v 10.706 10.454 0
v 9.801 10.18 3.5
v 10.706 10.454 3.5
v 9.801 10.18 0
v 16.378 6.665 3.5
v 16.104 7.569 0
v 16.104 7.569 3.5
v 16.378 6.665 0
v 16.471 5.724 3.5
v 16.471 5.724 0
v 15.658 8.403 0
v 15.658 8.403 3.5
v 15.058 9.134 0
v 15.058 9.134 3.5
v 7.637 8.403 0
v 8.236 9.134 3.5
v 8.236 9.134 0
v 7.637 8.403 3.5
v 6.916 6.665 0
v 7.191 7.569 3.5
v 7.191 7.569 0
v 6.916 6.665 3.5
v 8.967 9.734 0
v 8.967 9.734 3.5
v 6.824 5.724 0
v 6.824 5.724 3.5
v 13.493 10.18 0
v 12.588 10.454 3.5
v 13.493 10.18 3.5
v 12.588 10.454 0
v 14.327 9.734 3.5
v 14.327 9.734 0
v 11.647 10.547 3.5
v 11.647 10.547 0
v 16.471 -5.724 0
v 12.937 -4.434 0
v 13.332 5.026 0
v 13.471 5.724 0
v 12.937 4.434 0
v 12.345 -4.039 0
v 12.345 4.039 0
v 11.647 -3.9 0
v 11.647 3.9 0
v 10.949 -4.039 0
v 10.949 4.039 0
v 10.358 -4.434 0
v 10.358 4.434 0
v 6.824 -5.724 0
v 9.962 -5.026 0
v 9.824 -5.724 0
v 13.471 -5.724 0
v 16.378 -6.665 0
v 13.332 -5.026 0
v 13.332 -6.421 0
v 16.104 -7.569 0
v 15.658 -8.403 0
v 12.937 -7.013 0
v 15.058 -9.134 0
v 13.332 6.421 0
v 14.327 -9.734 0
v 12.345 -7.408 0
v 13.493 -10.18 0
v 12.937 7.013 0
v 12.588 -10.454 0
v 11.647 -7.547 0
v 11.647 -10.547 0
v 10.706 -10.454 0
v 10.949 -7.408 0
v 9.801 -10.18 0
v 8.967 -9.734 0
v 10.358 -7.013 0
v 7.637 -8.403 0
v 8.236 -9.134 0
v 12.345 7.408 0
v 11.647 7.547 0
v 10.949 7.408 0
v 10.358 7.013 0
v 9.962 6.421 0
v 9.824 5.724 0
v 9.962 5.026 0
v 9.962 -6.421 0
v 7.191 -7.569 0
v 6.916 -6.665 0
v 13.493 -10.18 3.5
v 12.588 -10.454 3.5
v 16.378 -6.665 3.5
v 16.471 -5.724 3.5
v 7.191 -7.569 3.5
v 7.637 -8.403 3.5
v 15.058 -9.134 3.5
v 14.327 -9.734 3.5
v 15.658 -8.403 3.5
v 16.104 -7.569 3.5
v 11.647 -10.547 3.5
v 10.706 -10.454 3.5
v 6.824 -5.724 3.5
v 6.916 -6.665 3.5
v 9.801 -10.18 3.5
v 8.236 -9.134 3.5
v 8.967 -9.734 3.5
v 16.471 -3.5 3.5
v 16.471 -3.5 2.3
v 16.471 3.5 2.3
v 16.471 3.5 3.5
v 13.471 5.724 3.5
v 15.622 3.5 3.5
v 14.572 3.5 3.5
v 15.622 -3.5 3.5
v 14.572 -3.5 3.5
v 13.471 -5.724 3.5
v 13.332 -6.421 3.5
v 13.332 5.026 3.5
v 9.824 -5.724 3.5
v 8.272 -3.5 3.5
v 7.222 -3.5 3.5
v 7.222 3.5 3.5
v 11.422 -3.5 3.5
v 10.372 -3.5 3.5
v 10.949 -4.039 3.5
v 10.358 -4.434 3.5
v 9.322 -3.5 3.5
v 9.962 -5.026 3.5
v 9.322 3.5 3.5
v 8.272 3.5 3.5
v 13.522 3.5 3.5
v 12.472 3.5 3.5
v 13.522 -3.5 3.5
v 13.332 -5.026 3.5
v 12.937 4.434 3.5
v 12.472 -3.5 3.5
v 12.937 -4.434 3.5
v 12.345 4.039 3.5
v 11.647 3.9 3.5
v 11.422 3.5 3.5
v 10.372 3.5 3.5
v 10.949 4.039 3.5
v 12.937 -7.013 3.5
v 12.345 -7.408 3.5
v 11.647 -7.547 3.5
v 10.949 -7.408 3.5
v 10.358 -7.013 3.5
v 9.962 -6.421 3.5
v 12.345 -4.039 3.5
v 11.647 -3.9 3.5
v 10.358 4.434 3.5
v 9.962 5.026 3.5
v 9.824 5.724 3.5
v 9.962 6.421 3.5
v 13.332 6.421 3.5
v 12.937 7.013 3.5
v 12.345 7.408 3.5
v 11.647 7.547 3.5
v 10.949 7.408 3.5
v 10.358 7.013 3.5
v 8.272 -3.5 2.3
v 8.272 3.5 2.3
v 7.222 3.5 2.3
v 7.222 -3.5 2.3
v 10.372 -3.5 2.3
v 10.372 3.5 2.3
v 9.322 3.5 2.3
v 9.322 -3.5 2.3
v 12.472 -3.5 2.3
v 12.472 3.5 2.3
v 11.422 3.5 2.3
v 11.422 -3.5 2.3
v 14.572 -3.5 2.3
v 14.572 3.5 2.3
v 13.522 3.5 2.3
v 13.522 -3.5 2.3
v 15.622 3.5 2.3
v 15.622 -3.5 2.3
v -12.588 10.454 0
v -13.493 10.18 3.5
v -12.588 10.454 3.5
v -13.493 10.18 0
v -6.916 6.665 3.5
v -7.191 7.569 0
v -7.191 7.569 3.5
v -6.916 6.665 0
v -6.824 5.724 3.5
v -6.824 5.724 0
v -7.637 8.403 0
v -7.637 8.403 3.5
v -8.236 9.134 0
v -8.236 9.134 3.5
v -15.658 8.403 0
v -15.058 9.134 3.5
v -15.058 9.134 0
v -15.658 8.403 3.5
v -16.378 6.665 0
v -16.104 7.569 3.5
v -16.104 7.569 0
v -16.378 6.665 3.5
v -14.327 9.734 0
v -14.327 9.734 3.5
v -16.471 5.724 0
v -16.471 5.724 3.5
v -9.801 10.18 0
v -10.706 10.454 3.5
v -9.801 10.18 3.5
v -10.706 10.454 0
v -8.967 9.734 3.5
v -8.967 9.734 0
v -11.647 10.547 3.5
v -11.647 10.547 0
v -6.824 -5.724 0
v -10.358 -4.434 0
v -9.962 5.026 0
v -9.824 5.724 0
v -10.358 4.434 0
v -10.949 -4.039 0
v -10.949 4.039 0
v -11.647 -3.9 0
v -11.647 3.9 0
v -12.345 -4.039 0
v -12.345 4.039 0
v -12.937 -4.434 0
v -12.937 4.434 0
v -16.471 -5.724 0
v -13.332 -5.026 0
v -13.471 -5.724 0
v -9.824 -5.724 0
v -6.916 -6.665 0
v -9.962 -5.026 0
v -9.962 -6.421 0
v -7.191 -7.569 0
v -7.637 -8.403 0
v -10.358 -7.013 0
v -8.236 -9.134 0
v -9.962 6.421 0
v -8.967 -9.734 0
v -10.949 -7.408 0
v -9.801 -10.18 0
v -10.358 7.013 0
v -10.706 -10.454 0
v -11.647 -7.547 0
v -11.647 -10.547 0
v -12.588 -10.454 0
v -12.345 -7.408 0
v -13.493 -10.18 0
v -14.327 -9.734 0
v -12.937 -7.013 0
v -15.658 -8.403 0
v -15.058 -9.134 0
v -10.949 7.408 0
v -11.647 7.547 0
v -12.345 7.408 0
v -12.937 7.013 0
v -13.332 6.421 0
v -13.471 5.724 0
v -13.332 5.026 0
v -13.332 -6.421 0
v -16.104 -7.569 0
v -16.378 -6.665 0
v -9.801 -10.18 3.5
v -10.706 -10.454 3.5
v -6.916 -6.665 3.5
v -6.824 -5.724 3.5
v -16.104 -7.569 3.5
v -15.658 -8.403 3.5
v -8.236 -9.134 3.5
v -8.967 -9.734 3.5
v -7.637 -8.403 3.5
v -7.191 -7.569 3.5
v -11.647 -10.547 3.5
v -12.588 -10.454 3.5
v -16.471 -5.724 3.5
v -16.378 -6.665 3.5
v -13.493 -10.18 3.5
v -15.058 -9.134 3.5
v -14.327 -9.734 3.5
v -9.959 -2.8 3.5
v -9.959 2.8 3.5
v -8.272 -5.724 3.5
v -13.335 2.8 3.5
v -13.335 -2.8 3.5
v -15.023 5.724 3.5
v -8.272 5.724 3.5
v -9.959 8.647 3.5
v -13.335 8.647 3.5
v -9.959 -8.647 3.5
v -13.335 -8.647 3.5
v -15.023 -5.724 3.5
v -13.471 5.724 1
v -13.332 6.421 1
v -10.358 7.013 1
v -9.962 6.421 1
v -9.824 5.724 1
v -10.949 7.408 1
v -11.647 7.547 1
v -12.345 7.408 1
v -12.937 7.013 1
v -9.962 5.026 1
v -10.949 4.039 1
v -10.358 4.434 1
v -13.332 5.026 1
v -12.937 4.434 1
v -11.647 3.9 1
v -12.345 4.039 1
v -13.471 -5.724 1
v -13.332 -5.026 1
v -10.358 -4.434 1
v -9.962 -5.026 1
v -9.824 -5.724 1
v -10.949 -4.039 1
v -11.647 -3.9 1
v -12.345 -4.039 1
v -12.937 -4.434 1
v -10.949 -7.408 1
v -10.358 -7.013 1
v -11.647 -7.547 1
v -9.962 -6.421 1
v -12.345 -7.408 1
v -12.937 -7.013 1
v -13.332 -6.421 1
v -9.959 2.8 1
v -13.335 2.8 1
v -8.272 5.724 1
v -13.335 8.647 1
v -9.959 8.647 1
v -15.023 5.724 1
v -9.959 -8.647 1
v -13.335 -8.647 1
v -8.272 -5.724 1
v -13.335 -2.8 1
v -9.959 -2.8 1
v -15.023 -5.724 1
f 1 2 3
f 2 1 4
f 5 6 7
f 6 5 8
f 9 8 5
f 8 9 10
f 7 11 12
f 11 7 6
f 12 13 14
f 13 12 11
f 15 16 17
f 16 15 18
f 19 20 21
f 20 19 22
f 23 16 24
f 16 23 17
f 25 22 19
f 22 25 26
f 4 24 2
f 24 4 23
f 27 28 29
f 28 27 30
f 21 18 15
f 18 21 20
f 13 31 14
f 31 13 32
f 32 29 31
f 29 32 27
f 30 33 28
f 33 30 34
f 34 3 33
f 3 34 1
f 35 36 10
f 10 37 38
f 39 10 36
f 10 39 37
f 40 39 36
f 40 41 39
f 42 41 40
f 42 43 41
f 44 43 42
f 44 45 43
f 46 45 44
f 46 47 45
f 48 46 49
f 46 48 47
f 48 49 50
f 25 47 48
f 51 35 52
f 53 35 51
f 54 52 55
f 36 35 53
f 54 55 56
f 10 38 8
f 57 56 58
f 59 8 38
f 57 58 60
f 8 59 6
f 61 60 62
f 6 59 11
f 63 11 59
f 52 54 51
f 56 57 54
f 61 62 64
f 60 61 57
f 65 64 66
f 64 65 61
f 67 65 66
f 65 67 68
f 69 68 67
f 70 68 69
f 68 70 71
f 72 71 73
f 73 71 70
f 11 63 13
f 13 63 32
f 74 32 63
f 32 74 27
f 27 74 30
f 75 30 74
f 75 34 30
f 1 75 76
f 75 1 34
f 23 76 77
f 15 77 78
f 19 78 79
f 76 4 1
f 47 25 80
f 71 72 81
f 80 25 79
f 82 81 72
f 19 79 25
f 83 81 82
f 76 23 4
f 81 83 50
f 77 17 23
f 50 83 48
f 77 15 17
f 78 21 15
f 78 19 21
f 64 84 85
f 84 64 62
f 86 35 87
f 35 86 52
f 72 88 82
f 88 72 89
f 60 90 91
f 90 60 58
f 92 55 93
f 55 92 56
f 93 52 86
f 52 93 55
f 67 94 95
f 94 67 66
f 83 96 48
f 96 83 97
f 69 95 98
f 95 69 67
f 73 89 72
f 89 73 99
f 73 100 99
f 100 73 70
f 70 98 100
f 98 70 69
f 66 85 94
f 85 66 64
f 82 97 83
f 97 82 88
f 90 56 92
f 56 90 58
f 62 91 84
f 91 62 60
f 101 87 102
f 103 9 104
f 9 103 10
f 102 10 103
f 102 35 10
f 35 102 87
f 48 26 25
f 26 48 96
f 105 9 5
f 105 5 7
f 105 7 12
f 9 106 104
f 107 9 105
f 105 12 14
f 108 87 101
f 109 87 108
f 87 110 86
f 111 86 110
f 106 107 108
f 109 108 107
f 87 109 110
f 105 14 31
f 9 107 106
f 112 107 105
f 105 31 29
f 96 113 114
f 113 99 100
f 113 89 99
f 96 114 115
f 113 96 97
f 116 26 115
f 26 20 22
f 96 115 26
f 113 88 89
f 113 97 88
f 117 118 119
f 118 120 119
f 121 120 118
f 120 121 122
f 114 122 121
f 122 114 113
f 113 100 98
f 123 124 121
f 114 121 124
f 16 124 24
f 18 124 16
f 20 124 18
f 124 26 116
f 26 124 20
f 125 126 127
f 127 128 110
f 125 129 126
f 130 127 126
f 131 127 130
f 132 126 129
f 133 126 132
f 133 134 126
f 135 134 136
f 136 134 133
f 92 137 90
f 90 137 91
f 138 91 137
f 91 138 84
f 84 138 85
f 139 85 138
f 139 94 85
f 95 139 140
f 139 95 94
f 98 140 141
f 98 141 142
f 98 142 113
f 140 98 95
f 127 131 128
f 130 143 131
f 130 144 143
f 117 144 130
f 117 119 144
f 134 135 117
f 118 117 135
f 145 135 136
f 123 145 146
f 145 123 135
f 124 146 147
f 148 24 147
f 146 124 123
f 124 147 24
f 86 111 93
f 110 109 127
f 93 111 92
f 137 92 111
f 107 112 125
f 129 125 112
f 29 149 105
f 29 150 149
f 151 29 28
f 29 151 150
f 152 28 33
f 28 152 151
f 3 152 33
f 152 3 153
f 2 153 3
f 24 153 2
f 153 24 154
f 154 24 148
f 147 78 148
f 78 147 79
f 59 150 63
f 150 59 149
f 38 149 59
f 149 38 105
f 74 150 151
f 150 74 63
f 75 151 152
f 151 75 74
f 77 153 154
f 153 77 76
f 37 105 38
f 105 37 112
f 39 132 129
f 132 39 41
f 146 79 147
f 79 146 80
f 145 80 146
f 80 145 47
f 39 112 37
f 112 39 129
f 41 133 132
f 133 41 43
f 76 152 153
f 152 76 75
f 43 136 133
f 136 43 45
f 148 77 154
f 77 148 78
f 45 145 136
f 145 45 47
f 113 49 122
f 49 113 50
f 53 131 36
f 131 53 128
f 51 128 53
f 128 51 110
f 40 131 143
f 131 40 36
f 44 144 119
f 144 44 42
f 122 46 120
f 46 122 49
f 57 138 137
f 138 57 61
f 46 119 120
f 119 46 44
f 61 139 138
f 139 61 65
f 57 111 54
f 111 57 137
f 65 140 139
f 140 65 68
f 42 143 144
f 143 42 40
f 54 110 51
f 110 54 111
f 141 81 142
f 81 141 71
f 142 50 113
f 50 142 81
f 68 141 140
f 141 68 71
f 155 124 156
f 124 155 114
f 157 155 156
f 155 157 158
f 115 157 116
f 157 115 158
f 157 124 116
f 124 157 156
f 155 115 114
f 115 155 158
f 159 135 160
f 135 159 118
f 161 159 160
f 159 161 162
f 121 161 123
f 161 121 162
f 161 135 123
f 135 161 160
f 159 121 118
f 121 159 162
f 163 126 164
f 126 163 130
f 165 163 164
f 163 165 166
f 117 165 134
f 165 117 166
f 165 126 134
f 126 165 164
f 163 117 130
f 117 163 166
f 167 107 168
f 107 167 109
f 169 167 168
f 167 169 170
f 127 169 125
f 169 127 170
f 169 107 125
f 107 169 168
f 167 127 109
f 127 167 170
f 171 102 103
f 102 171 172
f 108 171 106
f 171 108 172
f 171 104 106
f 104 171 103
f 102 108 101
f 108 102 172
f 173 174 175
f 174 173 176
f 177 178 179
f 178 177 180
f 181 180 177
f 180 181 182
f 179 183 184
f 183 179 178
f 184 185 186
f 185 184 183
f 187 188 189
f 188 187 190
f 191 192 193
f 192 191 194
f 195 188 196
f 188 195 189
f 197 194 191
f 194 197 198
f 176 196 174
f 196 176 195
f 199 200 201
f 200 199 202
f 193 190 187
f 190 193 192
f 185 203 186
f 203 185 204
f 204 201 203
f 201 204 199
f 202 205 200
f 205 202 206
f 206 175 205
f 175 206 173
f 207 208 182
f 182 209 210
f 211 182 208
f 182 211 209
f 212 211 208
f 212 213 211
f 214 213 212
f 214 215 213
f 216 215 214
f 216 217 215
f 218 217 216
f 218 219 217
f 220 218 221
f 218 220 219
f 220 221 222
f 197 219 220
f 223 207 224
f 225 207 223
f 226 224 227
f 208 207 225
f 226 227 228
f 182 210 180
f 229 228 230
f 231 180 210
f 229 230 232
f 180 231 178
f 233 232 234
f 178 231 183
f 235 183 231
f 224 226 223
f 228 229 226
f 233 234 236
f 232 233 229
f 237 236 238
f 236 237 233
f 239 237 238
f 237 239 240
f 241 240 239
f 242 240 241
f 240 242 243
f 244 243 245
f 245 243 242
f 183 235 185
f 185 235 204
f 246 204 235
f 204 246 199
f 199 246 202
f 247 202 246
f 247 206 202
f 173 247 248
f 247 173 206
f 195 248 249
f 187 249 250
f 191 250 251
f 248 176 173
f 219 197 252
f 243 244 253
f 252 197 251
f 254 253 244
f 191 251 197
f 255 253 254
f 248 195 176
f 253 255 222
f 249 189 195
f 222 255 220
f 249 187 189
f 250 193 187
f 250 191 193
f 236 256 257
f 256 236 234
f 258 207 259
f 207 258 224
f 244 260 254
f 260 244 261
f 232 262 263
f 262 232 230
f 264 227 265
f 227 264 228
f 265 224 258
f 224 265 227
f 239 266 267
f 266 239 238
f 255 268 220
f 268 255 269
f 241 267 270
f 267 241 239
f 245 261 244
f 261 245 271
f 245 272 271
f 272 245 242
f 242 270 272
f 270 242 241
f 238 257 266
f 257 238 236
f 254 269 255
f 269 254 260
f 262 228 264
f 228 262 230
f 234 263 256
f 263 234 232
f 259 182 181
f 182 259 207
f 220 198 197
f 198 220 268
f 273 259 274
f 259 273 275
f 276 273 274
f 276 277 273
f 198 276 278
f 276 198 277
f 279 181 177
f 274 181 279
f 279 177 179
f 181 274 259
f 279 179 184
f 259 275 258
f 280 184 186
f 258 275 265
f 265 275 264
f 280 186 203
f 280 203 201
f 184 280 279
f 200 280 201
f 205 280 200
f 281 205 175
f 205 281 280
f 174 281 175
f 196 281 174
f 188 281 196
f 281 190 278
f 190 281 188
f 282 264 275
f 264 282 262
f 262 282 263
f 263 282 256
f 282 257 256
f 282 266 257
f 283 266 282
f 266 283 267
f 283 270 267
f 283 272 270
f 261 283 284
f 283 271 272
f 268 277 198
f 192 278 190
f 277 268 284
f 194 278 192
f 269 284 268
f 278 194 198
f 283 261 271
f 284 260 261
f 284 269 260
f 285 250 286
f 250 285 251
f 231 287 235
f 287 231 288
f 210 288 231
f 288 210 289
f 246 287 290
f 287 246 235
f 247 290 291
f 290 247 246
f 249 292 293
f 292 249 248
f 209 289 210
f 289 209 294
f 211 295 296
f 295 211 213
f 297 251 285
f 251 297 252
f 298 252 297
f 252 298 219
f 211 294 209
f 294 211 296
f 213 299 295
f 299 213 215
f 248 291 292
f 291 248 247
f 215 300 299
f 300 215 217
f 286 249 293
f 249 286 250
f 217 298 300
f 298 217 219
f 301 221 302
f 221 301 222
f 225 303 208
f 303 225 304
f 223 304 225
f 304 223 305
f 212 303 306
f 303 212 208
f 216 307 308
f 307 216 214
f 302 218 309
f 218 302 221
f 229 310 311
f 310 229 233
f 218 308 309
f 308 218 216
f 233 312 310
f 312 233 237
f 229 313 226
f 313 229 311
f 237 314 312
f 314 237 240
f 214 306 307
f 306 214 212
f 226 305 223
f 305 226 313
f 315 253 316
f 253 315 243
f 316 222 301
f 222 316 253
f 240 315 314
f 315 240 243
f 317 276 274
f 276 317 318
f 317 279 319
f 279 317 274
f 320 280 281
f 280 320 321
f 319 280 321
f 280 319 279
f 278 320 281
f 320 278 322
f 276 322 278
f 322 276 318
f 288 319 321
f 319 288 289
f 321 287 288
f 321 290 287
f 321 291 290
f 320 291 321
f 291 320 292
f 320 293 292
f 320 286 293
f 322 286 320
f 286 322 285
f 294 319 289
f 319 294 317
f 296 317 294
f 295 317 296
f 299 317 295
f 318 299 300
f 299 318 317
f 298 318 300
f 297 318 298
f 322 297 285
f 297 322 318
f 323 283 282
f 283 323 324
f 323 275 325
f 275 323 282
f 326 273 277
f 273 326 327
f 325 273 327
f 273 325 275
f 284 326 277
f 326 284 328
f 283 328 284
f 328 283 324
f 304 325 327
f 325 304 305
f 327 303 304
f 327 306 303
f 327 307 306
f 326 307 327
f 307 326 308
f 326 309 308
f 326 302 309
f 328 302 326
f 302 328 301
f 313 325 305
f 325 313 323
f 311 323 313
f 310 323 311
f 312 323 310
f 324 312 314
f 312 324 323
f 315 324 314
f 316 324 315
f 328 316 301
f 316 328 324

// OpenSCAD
/* 

Y belt clamps for the Creality CR-7 MINI, e.g. available from
http://www.eastmachinery.com/product/8213.html

This little 3D printer doesn't have a decent way for fixing the belts.
I.e. they suggest just using plastic "cuffs".

Original code made by Triffid Hunter
http://www.thingiverse.com/thing:13479

Additional code from John Ridely' robust belt clamp/tightner for i3
Prusa (can't remember where I found this), i.d. I replaced the top
clamp code with the one from John Ridley

Daniel K. Schneider, TECFA, University of Geneva, Feb 2016

*/

// Define BELT properties in mm

// belt width (7mm default)
belt_width = 7; // 15 for a double, 7 for a single

// belt height (thinkness)
belt_height = 2;

// distance between teeth
tooth_offset = 2.1; // distance between teeth

// height of the teeth
tooth_height = 1.2;

// width of the teeth
tooth_width = 1.05; // roughtly == tooth_offset/2,  can be made a bit bigger or smaller (depends on your slicing)

// Distance between holes and perimeter
wall = 3;

/* tweeking extrusion ? */
extrusion_width = 0.4;

// Height of clamps
clamp_height = 3.5;

// Width of clamps (wall * 4)
clamp_width = 12;

/* Parameters for the ram (optional) */

ram_height = 7;
ram_length = 1.5; 

/* Definition of the nuts and bolts */

m3_diameter = 3 / cos(180 / 8) + 0.4;
m3_radius = m3_diameter / 2;

m3_nut_diameter = 5.5 / cos(180 / 6) + 0.4;
m3_nut_radius = m3_nut_diameter / 2;

m3_nut_depth = 2.5;

// ***************  models - comment if you like, e.g. for the CR-7 you only may need the clamps

translate([wall * 2 + m3_diameter + 2, 0, 0]) clamp_top(); // Clamp with grid
translate([-wall * 2 - m3_diameter - 2, 0, 0]) clamp_trap(); // Clamp with nut holes

// clamp_base(); // the ram base
// translate([wall * 4 + m3_diameter * 2 + 3, -belt_width, 0]) ram(); // ram 1
// translate([wall * 4 + m3_diameter * 2 + 3, belt_width, 0]) ram(); // ram 2


// ----------- code 

module clamp(h=10) {
	translate([-wall - m3_radius, 0, 0])
	difference() {
		intersection() {
			translate([0, belt_width / -2 - m3_diameter - wall - extrusion_width * 2, 0]) cube([wall * 2 + m3_diameter, belt_width + m3_diameter * 2 + wall * 2 + extrusion_width * 4, h]);
			union() {
				translate([wall + m3_radius, belt_width / 2 + m3_radius + extrusion_width, 0]) cylinder(r=wall + m3_radius, h=h + 1, $fn=32);
				translate([wall + m3_radius, -belt_width / 2 - m3_radius - extrusion_width, 0]) cylinder(r=wall + m3_radius, h=h + 1, $fn=32);
				translate([0, -belt_width / 2 - m3_radius - extrusion_width, 0]) cube([wall * 2 + m3_diameter, belt_width + m3_diameter  + extrusion_width * 2, h + 1]);
			}
		}
		translate([wall + m3_radius, belt_width / 2 + m3_radius + extrusion_width, -1]) cylinder(r=m3_radius, h=h + 2, $fn=16);
		translate([wall + m3_radius, belt_width / -2 - m3_radius - extrusion_width, -1]) cylinder(r=m3_radius, h=h + 2, $fn=16);
	}
}

module clamp_base() {
	difference() {
		clamp(belt_height + m3_nut_diameter);

		translate([-1 - wall - m3_radius, -belt_width / 2, m3_nut_diameter]) cube([wall * 4, belt_width, belt_height + 1]);
		translate([-1 - wall - m3_radius, 0, m3_nut_radius]) rotate([0, 90, 0]) rotate([0, 0, 180 / 8]) cylinder(r=m3_radius, h=wall * 4, $fn=8);
		translate([-1 - wall - m3_radius, 0, m3_nut_radius]) rotate([0, 90, 0]) rotate([0, 0, 180 / 6]) cylinder(r=m3_nut_radius, h=1 + m3_nut_depth, $fn=6);
	}
}

// clamp top with insets for holding the belt
// The code in the for loop was taken from John Ridely
module clamp_top() {
	difference() {
		clamp(clamp_height);
		for(i=[0:clamp_width/tooth_offset])
			{
			translate([(-clamp_width / 2) + (tooth_offset * i), 0, (clamp_height - tooth_height/2)])
				cube([tooth_width, belt_width, tooth_height], center=true);
			}
		}
	}


// clamp holding the 2 nuts
module clamp_trap() {
	difference() {
		clamp(clamp_height);
		translate([0, belt_width / 2 + m3_radius + extrusion_width, max(clamp_height - m3_nut_depth, 1)]) cylinder(r=m3_nut_radius, h=m3_nut_depth + 1, $fn=6);
		translate([0, belt_width / -2 - m3_radius - extrusion_width, max(clamp_height - m3_nut_depth, 1)]) cylinder(r=m3_nut_radius, h=m3_nut_depth + 1, $fn=6);
	}
}

// 2 blocks
module ram() {
	difference() {
		union() {
			cylinder(r=m3_nut_radius, h=ram_height, $fn=32);
			translate([0, -m3_nut_radius, 0]) cube([ram_length + 0.1, m3_nut_diameter, ram_height]);
		}
		translate([ram_length, -m3_nut_radius - 1, -1]) cube([m3_nut_diameter + 2, m3_nut_diameter + 2, ram_height + 2]);
		translate([-0.5, 0, ram_height / 2]) rotate([0, 90, 0]) rotate([0, 0, 180 / 8]) cylinder(r=m3_radius, h=2 + ram_length, $fn=8);
	}
}
